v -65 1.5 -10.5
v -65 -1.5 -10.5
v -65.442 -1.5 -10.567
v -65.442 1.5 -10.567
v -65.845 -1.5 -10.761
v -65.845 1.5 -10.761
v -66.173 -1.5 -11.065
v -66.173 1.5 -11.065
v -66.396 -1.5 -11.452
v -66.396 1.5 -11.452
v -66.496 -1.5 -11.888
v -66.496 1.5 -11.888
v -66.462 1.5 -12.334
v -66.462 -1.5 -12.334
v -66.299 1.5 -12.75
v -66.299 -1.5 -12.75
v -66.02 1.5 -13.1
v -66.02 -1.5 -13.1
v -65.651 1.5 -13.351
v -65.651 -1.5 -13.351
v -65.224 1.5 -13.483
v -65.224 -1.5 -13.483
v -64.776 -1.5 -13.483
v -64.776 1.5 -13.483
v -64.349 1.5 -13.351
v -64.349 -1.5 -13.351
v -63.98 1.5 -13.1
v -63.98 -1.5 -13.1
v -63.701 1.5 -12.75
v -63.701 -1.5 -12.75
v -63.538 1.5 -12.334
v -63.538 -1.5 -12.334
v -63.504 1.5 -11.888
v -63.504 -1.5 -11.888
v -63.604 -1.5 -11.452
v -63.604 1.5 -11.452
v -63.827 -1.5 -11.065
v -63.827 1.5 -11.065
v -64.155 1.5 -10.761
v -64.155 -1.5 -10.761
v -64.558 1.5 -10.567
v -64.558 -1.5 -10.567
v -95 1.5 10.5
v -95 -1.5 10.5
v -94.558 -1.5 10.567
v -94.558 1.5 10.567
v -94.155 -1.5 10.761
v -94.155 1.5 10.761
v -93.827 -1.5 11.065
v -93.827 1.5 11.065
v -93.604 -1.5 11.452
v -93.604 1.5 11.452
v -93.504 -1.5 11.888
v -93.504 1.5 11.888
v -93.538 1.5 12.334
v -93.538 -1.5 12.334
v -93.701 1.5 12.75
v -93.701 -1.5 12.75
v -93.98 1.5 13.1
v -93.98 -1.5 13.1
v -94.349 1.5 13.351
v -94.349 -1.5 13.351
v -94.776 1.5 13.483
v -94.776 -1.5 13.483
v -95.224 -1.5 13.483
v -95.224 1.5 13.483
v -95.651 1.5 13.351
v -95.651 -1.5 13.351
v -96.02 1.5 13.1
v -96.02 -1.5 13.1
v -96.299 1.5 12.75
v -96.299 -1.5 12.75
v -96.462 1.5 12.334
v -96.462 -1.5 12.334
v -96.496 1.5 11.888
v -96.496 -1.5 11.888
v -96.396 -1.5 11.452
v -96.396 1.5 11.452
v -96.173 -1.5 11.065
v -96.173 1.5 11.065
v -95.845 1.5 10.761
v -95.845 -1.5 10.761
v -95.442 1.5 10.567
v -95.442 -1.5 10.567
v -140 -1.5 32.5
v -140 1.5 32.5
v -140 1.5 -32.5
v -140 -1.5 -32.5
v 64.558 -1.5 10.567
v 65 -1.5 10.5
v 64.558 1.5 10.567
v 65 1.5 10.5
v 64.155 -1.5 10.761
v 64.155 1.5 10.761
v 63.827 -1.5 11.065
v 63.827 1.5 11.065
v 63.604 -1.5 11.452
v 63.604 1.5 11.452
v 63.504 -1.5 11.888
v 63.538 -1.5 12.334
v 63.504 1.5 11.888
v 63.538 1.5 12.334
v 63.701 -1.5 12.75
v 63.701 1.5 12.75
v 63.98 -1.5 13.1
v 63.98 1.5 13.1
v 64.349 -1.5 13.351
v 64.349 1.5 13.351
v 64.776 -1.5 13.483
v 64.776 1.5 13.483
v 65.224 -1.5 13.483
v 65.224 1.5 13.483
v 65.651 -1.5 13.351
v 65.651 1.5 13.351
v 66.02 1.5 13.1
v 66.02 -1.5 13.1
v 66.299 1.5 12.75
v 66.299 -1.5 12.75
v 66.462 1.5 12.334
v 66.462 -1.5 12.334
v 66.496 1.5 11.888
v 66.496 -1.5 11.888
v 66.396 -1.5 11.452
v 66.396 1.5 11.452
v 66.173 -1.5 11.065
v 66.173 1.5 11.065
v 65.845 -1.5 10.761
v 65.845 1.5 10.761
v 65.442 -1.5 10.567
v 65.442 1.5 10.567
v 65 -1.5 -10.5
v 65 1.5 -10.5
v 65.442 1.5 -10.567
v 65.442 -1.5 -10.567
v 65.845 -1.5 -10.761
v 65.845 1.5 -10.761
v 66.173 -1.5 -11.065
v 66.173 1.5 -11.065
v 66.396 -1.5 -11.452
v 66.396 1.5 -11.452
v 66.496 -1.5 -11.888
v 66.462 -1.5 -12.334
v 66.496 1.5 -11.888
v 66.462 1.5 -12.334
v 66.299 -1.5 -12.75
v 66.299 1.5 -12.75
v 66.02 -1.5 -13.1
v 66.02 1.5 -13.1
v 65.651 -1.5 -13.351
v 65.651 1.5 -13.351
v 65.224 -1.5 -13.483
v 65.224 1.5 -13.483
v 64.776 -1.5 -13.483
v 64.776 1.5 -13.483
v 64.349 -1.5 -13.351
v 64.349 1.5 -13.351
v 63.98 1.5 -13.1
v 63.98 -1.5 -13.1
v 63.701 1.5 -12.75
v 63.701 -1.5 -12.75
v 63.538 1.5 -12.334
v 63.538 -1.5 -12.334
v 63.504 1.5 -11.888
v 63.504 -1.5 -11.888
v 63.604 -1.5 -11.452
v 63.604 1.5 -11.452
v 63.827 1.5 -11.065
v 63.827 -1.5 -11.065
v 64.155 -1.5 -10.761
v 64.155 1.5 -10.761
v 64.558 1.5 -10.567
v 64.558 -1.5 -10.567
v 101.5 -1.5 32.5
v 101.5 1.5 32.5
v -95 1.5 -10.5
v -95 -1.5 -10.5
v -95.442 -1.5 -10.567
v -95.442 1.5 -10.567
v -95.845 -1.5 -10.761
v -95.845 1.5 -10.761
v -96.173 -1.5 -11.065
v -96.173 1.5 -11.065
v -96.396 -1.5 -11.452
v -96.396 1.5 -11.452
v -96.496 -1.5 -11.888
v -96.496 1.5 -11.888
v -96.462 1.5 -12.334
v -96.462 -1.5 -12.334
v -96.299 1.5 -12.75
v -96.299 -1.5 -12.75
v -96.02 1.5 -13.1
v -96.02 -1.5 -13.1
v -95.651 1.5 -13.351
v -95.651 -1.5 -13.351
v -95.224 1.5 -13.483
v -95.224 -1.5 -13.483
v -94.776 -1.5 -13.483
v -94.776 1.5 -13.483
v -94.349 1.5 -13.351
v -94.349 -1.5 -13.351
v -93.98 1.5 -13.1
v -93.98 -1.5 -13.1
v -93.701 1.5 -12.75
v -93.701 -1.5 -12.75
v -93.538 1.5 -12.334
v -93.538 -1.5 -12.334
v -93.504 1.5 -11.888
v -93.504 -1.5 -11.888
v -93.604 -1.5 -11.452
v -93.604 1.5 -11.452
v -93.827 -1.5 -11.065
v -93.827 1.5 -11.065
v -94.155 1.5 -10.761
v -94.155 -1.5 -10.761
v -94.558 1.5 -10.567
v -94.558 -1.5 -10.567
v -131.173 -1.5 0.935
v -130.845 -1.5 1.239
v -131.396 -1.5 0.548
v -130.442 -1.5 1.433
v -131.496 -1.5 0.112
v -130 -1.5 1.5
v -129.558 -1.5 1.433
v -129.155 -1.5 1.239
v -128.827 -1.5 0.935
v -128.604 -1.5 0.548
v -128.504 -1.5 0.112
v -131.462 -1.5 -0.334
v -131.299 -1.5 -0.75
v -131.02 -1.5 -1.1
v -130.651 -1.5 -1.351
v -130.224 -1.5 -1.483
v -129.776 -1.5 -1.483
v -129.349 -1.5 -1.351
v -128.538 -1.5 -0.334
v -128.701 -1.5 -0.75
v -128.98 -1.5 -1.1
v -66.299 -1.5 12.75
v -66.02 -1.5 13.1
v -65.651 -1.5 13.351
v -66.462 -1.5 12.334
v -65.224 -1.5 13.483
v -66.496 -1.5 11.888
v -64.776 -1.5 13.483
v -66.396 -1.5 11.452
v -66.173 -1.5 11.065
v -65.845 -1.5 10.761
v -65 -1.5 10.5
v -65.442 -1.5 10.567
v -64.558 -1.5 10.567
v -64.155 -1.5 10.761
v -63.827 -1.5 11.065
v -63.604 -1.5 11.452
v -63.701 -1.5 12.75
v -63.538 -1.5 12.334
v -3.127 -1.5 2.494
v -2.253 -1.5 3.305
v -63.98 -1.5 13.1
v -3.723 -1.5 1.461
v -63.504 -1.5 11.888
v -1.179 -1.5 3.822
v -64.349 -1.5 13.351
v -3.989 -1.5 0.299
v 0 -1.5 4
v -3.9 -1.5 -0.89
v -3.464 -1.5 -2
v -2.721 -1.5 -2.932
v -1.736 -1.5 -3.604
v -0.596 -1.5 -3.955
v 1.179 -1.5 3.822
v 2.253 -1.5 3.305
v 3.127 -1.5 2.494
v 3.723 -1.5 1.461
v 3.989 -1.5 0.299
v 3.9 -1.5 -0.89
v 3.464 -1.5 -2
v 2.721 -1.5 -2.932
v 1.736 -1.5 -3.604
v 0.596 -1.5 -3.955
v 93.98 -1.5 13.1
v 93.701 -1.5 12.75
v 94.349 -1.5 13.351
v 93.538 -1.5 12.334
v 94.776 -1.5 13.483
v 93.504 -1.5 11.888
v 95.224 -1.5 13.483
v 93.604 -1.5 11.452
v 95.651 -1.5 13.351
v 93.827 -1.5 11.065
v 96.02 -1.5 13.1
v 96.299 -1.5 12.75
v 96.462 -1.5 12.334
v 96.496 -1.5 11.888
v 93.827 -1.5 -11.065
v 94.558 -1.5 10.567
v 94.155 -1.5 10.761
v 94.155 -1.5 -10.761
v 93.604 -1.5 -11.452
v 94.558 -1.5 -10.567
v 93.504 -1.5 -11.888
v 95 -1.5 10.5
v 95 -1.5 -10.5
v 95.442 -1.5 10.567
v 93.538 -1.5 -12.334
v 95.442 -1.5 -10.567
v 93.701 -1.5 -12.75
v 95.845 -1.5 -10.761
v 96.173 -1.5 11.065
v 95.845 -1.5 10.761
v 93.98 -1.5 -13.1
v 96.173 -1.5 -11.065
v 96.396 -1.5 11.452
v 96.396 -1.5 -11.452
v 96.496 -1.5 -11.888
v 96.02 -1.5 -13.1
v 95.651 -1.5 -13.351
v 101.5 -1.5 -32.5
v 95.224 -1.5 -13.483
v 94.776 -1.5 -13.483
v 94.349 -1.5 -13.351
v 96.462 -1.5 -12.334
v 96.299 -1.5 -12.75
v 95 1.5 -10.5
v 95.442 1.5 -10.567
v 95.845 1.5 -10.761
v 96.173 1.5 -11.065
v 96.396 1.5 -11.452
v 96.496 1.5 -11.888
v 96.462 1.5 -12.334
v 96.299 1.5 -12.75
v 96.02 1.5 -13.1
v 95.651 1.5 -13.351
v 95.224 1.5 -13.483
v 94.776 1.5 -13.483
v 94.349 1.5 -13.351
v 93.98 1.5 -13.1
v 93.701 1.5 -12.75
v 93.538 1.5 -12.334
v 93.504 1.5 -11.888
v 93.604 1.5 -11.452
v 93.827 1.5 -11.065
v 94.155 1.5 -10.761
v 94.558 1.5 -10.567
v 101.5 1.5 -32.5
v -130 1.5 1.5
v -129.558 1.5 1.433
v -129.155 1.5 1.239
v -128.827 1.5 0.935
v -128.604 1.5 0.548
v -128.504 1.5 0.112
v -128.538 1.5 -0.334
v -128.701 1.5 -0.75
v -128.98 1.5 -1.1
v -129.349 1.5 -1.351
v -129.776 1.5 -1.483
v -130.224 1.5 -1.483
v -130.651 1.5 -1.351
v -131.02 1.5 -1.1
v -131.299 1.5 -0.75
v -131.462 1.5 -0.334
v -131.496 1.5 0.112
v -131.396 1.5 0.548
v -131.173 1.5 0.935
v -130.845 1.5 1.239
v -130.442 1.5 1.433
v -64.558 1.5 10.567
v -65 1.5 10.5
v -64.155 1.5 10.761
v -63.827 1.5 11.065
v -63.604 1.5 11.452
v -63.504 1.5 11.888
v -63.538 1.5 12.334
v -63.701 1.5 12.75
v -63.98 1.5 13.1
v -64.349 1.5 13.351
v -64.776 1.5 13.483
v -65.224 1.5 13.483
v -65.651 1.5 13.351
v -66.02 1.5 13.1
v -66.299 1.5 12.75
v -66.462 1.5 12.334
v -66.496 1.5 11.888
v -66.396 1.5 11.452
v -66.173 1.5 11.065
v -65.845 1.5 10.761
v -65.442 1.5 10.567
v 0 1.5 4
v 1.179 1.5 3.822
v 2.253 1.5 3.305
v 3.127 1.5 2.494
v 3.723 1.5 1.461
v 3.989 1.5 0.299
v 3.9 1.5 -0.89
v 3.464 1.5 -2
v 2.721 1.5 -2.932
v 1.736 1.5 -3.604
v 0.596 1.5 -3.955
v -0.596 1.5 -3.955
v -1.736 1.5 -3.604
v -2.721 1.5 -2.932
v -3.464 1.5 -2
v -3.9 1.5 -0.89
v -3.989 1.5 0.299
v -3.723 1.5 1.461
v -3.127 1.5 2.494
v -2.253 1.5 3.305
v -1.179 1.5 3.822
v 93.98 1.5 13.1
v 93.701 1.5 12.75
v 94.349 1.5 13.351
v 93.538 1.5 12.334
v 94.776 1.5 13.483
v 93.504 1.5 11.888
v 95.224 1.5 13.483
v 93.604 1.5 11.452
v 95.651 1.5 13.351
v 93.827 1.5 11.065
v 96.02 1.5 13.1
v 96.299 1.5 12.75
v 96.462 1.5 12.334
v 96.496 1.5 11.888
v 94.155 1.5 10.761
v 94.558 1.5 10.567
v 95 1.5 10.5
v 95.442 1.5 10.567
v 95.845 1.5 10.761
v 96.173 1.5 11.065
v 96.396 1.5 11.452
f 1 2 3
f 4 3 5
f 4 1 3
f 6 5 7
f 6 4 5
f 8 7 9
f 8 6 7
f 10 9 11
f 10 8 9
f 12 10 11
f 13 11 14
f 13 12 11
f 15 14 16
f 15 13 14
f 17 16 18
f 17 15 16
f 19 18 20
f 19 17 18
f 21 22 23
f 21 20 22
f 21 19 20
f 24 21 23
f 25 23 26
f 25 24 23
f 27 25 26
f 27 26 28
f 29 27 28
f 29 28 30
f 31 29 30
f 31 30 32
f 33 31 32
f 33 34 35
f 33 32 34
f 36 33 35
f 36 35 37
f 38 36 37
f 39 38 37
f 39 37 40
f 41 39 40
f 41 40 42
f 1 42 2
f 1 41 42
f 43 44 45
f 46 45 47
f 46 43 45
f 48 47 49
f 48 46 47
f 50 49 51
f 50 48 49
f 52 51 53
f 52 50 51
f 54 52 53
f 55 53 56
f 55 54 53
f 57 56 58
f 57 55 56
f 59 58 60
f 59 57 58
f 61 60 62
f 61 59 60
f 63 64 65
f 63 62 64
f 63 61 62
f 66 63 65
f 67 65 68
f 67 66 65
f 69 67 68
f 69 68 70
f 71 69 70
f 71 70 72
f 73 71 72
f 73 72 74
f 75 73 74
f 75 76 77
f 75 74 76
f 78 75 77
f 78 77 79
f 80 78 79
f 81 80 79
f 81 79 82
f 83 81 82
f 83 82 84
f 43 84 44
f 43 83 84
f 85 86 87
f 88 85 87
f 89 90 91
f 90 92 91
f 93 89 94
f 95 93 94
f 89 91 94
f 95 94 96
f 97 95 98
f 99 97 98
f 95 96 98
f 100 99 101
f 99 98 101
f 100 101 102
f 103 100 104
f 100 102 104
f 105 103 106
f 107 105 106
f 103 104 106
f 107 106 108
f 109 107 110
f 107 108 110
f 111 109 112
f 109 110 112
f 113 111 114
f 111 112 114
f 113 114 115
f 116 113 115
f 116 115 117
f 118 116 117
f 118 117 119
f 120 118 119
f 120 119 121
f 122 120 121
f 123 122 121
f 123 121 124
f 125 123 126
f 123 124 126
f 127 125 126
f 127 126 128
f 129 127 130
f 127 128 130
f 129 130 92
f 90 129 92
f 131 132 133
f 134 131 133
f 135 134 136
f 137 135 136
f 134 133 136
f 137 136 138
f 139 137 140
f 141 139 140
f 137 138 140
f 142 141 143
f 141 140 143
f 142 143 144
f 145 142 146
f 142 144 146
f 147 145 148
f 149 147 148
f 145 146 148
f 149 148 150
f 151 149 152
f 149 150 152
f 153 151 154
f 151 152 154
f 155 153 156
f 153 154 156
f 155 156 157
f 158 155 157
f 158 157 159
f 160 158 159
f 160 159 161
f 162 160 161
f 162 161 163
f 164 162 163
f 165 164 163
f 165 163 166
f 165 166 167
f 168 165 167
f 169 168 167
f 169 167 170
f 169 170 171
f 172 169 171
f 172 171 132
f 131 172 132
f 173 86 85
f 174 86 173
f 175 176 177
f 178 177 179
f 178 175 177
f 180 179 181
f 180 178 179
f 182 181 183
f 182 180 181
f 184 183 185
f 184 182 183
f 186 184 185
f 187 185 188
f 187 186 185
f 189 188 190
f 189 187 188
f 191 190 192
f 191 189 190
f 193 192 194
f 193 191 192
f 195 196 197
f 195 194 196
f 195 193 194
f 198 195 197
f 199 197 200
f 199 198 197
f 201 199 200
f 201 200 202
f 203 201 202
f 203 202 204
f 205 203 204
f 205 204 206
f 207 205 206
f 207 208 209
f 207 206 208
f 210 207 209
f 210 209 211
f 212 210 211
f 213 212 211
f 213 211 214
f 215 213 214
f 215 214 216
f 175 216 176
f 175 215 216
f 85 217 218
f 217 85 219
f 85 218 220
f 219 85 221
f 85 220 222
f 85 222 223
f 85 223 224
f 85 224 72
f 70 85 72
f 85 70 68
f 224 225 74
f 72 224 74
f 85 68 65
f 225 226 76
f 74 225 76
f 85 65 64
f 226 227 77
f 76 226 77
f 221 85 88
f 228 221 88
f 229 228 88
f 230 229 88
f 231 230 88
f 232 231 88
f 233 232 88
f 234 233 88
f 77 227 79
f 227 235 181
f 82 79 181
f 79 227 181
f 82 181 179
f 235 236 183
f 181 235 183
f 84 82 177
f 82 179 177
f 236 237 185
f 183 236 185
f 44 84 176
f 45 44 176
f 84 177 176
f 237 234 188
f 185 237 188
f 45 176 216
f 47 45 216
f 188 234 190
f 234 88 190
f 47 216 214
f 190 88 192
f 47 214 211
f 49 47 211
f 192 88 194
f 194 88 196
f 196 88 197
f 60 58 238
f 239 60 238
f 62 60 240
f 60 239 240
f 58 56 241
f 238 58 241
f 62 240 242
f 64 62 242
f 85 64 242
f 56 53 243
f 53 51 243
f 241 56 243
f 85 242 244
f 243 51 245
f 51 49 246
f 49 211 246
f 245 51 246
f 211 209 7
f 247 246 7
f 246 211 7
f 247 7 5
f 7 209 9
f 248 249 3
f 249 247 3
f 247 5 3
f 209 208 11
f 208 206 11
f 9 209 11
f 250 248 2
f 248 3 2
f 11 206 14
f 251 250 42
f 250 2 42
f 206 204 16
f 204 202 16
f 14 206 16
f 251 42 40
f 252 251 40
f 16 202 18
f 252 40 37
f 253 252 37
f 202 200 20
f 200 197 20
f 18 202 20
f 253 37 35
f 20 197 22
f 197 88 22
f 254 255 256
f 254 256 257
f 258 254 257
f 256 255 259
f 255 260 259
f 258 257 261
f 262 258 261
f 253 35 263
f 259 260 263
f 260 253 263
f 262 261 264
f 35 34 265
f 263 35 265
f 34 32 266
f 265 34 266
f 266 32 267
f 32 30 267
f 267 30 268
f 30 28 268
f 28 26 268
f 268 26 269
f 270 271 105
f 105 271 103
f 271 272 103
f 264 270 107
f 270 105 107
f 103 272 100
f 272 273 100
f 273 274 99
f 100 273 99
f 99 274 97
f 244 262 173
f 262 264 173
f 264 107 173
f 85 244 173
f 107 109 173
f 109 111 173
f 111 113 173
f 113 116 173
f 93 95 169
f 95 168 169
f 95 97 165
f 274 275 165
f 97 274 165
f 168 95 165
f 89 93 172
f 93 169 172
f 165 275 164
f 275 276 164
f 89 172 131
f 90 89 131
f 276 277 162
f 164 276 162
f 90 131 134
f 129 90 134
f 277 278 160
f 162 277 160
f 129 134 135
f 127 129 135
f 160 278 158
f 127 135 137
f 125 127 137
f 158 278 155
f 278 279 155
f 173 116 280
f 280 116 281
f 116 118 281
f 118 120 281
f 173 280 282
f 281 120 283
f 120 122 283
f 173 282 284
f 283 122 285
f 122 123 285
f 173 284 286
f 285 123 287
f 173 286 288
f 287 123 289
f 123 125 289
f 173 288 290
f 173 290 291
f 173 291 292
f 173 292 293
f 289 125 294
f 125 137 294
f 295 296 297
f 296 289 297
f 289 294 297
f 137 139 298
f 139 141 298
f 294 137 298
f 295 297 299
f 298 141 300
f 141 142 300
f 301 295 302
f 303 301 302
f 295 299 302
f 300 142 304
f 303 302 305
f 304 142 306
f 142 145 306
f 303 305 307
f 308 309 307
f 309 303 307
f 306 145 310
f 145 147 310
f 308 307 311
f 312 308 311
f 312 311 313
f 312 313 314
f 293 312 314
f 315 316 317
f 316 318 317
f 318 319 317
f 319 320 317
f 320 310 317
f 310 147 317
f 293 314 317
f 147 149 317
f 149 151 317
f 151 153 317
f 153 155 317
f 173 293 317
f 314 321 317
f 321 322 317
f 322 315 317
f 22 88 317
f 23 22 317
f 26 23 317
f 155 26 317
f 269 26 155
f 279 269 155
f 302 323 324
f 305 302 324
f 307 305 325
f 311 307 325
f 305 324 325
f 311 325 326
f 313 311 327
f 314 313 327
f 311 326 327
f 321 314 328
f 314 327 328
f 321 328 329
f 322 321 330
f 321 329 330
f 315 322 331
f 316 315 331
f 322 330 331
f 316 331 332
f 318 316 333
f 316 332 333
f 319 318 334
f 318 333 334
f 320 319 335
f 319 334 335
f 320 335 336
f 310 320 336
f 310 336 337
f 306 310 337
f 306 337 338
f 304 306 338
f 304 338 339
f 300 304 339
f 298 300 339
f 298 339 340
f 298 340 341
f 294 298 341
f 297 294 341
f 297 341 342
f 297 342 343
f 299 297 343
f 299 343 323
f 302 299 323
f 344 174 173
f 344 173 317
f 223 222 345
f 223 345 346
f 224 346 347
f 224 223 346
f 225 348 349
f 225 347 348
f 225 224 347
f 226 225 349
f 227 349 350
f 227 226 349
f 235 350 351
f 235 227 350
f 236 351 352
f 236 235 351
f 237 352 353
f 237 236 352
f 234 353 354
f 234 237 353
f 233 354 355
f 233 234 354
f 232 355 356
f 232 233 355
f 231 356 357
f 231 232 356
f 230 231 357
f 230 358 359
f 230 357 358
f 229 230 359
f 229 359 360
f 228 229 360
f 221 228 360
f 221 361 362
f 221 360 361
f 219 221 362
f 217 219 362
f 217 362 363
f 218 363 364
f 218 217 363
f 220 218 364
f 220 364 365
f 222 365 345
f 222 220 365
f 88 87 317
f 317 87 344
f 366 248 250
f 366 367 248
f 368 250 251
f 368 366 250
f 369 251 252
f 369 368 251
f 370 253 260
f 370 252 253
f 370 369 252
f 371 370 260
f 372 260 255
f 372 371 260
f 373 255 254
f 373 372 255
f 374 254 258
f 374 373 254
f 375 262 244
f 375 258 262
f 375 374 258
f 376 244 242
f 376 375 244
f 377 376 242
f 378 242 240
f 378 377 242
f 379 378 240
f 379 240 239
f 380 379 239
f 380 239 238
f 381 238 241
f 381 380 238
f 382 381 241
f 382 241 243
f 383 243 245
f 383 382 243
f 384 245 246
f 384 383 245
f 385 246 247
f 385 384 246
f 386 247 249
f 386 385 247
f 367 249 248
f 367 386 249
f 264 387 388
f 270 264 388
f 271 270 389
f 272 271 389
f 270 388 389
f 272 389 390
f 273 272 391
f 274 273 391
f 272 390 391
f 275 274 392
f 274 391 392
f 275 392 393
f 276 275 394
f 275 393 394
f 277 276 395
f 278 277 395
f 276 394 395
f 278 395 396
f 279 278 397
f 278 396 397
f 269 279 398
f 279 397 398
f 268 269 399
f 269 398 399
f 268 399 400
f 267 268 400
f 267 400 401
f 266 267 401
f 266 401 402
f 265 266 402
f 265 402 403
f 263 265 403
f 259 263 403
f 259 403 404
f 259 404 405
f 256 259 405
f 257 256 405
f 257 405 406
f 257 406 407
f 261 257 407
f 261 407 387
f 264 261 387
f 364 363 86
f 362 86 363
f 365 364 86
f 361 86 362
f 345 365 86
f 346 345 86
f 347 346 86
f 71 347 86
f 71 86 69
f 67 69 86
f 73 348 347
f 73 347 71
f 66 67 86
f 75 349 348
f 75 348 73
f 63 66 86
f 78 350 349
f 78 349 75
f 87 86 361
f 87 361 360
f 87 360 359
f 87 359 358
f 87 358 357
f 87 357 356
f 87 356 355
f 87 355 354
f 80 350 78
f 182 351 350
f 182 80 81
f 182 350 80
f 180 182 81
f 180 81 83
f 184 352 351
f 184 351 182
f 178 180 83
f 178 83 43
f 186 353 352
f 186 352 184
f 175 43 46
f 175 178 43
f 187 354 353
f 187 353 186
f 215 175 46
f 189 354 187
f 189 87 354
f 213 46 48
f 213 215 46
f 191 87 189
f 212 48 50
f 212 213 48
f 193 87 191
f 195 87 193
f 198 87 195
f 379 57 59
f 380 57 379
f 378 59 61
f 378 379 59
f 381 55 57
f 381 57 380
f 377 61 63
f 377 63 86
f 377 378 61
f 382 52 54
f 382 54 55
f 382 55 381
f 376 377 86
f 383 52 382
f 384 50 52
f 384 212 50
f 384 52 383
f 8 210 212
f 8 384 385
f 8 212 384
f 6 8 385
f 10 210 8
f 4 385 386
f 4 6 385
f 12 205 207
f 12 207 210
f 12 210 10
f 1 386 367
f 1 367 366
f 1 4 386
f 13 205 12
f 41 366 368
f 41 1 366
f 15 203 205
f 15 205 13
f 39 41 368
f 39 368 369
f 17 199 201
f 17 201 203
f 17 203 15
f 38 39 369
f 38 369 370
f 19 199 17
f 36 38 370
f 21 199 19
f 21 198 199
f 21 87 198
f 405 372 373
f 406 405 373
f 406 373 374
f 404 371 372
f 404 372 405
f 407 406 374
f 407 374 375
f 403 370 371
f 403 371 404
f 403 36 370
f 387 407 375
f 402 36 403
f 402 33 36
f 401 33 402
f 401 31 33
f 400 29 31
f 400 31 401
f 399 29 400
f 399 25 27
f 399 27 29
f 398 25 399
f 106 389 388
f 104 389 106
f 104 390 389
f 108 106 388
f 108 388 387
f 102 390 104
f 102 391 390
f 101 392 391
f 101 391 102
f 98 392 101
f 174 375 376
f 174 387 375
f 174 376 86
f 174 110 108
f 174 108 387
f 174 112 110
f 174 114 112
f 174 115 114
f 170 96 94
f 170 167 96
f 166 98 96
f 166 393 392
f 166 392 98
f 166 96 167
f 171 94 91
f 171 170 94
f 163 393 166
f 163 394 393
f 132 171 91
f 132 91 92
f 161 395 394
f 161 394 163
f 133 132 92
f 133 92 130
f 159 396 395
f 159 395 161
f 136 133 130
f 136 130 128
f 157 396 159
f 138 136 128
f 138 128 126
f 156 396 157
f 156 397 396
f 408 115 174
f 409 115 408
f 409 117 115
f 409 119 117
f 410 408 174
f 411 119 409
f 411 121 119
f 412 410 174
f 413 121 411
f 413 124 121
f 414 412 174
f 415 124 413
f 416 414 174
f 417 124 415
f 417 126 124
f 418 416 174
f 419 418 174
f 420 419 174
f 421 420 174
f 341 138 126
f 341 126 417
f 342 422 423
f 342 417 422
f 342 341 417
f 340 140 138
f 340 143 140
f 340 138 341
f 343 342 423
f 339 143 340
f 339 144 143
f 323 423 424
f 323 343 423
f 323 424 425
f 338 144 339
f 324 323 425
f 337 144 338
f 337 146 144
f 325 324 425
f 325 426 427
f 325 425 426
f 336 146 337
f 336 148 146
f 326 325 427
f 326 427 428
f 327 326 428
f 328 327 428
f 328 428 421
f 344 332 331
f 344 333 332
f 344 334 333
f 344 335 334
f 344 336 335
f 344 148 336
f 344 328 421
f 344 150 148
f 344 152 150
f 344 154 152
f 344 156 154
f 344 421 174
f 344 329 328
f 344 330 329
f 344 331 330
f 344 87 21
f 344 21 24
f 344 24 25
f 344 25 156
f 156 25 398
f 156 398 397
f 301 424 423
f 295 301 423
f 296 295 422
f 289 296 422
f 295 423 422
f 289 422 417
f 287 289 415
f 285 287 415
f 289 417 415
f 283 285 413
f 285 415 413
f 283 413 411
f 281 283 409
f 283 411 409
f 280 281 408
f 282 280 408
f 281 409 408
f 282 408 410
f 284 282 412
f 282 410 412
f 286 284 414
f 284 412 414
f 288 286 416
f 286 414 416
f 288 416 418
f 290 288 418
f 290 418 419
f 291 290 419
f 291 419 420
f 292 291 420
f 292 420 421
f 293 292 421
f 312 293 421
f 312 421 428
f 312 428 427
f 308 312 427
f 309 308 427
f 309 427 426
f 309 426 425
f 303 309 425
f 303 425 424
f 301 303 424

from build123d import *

# Parameters (mm, degrees)
SKETCH1_W               = 241.5
SKETCH1_H               = 65
BOSS_EXTRUDE1_DEPTH     = 1.5
SKETCH3_R               = 4
CUT_EXTRUDE2_DEPTH      = 144.754130375
SKETCH4_R               = 1.5
CUT_EXTRUDE3_DEPTH      = 144.754130375
CUT_EXTRUDE4_DEPTH      = 144.754130375
CUT_EXTRUDE4_DEPTH_BACK = 144.754130375
SKETCH5_R               = 1.5


with BuildPart() as part:
    # Sketch1 → Boss-Extrude1 (new, symmetric)
    with BuildSketch(Plane(origin=(0, 0, 0), x_dir=(1, 0, 0), z_dir=(0, 1, 0))):
        with Locations((-19.25, 0)):
            Rectangle(SKETCH1_W, SKETCH1_H)
    extrude(amount=BOSS_EXTRUDE1_DEPTH, both=True)

    # Sketch3 → Cut-Extrude2 (cut, through all)
    with BuildSketch(Plane(origin=(0, 1.5, 0), x_dir=(1, 0, 0), z_dir=(0, 1, 0))):
        with Locations(Location((0, 0, 0), (0, 0, 270))):
            Circle(SKETCH3_R)
    extrude(amount=-CUT_EXTRUDE2_DEPTH, mode=Mode.SUBTRACT)

    # Sketch4 → Cut-Extrude3 (cut, symmetric)
    with BuildSketch(Plane(origin=(0, 1.5, 0), x_dir=(1, 0, 0), z_dir=(0, 1, 0))):
        with Locations(Location((65, 12, 0), (0, 0, 270))):
            Circle(SKETCH4_R)
        with Locations(Location((95, 12, 0), (0, 0, 270))):
            Circle(SKETCH4_R)
        with Locations(Location((95, -12, 0), (0, 0, 90))):
            Circle(SKETCH4_R)
        with Locations(Location((65, -12, 0), (0, 0, 90))):
            Circle(SKETCH4_R)
    cut_extrude3 = extrude(amount=CUT_EXTRUDE3_DEPTH, both=True, mode=Mode.SUBTRACT)

    # Mirror2: Cut-Extrude3 across plane
    add(cut_extrude3.mirror(Plane(origin=(0, 0, 0), x_dir=(0, 0, 1), z_dir=(1, 0, 0))), mode=Mode.SUBTRACT)

    # Sketch5 → Cut-Extrude4 (cut, two sides: drawn at the far end of the back side and taken through both)
    with BuildSketch(Plane(origin=(0, 1.5, 0), x_dir=(1, 0, 0), z_dir=(0, 1, 0)).offset(-CUT_EXTRUDE4_DEPTH_BACK)):
        with Locations(Location((-130, 0, 0), (0, 0, 270))):
            Circle(SKETCH5_R)
    extrude(amount=CUT_EXTRUDE4_DEPTH + CUT_EXTRUDE4_DEPTH_BACK, mode=Mode.SUBTRACT)


solid = part.part
